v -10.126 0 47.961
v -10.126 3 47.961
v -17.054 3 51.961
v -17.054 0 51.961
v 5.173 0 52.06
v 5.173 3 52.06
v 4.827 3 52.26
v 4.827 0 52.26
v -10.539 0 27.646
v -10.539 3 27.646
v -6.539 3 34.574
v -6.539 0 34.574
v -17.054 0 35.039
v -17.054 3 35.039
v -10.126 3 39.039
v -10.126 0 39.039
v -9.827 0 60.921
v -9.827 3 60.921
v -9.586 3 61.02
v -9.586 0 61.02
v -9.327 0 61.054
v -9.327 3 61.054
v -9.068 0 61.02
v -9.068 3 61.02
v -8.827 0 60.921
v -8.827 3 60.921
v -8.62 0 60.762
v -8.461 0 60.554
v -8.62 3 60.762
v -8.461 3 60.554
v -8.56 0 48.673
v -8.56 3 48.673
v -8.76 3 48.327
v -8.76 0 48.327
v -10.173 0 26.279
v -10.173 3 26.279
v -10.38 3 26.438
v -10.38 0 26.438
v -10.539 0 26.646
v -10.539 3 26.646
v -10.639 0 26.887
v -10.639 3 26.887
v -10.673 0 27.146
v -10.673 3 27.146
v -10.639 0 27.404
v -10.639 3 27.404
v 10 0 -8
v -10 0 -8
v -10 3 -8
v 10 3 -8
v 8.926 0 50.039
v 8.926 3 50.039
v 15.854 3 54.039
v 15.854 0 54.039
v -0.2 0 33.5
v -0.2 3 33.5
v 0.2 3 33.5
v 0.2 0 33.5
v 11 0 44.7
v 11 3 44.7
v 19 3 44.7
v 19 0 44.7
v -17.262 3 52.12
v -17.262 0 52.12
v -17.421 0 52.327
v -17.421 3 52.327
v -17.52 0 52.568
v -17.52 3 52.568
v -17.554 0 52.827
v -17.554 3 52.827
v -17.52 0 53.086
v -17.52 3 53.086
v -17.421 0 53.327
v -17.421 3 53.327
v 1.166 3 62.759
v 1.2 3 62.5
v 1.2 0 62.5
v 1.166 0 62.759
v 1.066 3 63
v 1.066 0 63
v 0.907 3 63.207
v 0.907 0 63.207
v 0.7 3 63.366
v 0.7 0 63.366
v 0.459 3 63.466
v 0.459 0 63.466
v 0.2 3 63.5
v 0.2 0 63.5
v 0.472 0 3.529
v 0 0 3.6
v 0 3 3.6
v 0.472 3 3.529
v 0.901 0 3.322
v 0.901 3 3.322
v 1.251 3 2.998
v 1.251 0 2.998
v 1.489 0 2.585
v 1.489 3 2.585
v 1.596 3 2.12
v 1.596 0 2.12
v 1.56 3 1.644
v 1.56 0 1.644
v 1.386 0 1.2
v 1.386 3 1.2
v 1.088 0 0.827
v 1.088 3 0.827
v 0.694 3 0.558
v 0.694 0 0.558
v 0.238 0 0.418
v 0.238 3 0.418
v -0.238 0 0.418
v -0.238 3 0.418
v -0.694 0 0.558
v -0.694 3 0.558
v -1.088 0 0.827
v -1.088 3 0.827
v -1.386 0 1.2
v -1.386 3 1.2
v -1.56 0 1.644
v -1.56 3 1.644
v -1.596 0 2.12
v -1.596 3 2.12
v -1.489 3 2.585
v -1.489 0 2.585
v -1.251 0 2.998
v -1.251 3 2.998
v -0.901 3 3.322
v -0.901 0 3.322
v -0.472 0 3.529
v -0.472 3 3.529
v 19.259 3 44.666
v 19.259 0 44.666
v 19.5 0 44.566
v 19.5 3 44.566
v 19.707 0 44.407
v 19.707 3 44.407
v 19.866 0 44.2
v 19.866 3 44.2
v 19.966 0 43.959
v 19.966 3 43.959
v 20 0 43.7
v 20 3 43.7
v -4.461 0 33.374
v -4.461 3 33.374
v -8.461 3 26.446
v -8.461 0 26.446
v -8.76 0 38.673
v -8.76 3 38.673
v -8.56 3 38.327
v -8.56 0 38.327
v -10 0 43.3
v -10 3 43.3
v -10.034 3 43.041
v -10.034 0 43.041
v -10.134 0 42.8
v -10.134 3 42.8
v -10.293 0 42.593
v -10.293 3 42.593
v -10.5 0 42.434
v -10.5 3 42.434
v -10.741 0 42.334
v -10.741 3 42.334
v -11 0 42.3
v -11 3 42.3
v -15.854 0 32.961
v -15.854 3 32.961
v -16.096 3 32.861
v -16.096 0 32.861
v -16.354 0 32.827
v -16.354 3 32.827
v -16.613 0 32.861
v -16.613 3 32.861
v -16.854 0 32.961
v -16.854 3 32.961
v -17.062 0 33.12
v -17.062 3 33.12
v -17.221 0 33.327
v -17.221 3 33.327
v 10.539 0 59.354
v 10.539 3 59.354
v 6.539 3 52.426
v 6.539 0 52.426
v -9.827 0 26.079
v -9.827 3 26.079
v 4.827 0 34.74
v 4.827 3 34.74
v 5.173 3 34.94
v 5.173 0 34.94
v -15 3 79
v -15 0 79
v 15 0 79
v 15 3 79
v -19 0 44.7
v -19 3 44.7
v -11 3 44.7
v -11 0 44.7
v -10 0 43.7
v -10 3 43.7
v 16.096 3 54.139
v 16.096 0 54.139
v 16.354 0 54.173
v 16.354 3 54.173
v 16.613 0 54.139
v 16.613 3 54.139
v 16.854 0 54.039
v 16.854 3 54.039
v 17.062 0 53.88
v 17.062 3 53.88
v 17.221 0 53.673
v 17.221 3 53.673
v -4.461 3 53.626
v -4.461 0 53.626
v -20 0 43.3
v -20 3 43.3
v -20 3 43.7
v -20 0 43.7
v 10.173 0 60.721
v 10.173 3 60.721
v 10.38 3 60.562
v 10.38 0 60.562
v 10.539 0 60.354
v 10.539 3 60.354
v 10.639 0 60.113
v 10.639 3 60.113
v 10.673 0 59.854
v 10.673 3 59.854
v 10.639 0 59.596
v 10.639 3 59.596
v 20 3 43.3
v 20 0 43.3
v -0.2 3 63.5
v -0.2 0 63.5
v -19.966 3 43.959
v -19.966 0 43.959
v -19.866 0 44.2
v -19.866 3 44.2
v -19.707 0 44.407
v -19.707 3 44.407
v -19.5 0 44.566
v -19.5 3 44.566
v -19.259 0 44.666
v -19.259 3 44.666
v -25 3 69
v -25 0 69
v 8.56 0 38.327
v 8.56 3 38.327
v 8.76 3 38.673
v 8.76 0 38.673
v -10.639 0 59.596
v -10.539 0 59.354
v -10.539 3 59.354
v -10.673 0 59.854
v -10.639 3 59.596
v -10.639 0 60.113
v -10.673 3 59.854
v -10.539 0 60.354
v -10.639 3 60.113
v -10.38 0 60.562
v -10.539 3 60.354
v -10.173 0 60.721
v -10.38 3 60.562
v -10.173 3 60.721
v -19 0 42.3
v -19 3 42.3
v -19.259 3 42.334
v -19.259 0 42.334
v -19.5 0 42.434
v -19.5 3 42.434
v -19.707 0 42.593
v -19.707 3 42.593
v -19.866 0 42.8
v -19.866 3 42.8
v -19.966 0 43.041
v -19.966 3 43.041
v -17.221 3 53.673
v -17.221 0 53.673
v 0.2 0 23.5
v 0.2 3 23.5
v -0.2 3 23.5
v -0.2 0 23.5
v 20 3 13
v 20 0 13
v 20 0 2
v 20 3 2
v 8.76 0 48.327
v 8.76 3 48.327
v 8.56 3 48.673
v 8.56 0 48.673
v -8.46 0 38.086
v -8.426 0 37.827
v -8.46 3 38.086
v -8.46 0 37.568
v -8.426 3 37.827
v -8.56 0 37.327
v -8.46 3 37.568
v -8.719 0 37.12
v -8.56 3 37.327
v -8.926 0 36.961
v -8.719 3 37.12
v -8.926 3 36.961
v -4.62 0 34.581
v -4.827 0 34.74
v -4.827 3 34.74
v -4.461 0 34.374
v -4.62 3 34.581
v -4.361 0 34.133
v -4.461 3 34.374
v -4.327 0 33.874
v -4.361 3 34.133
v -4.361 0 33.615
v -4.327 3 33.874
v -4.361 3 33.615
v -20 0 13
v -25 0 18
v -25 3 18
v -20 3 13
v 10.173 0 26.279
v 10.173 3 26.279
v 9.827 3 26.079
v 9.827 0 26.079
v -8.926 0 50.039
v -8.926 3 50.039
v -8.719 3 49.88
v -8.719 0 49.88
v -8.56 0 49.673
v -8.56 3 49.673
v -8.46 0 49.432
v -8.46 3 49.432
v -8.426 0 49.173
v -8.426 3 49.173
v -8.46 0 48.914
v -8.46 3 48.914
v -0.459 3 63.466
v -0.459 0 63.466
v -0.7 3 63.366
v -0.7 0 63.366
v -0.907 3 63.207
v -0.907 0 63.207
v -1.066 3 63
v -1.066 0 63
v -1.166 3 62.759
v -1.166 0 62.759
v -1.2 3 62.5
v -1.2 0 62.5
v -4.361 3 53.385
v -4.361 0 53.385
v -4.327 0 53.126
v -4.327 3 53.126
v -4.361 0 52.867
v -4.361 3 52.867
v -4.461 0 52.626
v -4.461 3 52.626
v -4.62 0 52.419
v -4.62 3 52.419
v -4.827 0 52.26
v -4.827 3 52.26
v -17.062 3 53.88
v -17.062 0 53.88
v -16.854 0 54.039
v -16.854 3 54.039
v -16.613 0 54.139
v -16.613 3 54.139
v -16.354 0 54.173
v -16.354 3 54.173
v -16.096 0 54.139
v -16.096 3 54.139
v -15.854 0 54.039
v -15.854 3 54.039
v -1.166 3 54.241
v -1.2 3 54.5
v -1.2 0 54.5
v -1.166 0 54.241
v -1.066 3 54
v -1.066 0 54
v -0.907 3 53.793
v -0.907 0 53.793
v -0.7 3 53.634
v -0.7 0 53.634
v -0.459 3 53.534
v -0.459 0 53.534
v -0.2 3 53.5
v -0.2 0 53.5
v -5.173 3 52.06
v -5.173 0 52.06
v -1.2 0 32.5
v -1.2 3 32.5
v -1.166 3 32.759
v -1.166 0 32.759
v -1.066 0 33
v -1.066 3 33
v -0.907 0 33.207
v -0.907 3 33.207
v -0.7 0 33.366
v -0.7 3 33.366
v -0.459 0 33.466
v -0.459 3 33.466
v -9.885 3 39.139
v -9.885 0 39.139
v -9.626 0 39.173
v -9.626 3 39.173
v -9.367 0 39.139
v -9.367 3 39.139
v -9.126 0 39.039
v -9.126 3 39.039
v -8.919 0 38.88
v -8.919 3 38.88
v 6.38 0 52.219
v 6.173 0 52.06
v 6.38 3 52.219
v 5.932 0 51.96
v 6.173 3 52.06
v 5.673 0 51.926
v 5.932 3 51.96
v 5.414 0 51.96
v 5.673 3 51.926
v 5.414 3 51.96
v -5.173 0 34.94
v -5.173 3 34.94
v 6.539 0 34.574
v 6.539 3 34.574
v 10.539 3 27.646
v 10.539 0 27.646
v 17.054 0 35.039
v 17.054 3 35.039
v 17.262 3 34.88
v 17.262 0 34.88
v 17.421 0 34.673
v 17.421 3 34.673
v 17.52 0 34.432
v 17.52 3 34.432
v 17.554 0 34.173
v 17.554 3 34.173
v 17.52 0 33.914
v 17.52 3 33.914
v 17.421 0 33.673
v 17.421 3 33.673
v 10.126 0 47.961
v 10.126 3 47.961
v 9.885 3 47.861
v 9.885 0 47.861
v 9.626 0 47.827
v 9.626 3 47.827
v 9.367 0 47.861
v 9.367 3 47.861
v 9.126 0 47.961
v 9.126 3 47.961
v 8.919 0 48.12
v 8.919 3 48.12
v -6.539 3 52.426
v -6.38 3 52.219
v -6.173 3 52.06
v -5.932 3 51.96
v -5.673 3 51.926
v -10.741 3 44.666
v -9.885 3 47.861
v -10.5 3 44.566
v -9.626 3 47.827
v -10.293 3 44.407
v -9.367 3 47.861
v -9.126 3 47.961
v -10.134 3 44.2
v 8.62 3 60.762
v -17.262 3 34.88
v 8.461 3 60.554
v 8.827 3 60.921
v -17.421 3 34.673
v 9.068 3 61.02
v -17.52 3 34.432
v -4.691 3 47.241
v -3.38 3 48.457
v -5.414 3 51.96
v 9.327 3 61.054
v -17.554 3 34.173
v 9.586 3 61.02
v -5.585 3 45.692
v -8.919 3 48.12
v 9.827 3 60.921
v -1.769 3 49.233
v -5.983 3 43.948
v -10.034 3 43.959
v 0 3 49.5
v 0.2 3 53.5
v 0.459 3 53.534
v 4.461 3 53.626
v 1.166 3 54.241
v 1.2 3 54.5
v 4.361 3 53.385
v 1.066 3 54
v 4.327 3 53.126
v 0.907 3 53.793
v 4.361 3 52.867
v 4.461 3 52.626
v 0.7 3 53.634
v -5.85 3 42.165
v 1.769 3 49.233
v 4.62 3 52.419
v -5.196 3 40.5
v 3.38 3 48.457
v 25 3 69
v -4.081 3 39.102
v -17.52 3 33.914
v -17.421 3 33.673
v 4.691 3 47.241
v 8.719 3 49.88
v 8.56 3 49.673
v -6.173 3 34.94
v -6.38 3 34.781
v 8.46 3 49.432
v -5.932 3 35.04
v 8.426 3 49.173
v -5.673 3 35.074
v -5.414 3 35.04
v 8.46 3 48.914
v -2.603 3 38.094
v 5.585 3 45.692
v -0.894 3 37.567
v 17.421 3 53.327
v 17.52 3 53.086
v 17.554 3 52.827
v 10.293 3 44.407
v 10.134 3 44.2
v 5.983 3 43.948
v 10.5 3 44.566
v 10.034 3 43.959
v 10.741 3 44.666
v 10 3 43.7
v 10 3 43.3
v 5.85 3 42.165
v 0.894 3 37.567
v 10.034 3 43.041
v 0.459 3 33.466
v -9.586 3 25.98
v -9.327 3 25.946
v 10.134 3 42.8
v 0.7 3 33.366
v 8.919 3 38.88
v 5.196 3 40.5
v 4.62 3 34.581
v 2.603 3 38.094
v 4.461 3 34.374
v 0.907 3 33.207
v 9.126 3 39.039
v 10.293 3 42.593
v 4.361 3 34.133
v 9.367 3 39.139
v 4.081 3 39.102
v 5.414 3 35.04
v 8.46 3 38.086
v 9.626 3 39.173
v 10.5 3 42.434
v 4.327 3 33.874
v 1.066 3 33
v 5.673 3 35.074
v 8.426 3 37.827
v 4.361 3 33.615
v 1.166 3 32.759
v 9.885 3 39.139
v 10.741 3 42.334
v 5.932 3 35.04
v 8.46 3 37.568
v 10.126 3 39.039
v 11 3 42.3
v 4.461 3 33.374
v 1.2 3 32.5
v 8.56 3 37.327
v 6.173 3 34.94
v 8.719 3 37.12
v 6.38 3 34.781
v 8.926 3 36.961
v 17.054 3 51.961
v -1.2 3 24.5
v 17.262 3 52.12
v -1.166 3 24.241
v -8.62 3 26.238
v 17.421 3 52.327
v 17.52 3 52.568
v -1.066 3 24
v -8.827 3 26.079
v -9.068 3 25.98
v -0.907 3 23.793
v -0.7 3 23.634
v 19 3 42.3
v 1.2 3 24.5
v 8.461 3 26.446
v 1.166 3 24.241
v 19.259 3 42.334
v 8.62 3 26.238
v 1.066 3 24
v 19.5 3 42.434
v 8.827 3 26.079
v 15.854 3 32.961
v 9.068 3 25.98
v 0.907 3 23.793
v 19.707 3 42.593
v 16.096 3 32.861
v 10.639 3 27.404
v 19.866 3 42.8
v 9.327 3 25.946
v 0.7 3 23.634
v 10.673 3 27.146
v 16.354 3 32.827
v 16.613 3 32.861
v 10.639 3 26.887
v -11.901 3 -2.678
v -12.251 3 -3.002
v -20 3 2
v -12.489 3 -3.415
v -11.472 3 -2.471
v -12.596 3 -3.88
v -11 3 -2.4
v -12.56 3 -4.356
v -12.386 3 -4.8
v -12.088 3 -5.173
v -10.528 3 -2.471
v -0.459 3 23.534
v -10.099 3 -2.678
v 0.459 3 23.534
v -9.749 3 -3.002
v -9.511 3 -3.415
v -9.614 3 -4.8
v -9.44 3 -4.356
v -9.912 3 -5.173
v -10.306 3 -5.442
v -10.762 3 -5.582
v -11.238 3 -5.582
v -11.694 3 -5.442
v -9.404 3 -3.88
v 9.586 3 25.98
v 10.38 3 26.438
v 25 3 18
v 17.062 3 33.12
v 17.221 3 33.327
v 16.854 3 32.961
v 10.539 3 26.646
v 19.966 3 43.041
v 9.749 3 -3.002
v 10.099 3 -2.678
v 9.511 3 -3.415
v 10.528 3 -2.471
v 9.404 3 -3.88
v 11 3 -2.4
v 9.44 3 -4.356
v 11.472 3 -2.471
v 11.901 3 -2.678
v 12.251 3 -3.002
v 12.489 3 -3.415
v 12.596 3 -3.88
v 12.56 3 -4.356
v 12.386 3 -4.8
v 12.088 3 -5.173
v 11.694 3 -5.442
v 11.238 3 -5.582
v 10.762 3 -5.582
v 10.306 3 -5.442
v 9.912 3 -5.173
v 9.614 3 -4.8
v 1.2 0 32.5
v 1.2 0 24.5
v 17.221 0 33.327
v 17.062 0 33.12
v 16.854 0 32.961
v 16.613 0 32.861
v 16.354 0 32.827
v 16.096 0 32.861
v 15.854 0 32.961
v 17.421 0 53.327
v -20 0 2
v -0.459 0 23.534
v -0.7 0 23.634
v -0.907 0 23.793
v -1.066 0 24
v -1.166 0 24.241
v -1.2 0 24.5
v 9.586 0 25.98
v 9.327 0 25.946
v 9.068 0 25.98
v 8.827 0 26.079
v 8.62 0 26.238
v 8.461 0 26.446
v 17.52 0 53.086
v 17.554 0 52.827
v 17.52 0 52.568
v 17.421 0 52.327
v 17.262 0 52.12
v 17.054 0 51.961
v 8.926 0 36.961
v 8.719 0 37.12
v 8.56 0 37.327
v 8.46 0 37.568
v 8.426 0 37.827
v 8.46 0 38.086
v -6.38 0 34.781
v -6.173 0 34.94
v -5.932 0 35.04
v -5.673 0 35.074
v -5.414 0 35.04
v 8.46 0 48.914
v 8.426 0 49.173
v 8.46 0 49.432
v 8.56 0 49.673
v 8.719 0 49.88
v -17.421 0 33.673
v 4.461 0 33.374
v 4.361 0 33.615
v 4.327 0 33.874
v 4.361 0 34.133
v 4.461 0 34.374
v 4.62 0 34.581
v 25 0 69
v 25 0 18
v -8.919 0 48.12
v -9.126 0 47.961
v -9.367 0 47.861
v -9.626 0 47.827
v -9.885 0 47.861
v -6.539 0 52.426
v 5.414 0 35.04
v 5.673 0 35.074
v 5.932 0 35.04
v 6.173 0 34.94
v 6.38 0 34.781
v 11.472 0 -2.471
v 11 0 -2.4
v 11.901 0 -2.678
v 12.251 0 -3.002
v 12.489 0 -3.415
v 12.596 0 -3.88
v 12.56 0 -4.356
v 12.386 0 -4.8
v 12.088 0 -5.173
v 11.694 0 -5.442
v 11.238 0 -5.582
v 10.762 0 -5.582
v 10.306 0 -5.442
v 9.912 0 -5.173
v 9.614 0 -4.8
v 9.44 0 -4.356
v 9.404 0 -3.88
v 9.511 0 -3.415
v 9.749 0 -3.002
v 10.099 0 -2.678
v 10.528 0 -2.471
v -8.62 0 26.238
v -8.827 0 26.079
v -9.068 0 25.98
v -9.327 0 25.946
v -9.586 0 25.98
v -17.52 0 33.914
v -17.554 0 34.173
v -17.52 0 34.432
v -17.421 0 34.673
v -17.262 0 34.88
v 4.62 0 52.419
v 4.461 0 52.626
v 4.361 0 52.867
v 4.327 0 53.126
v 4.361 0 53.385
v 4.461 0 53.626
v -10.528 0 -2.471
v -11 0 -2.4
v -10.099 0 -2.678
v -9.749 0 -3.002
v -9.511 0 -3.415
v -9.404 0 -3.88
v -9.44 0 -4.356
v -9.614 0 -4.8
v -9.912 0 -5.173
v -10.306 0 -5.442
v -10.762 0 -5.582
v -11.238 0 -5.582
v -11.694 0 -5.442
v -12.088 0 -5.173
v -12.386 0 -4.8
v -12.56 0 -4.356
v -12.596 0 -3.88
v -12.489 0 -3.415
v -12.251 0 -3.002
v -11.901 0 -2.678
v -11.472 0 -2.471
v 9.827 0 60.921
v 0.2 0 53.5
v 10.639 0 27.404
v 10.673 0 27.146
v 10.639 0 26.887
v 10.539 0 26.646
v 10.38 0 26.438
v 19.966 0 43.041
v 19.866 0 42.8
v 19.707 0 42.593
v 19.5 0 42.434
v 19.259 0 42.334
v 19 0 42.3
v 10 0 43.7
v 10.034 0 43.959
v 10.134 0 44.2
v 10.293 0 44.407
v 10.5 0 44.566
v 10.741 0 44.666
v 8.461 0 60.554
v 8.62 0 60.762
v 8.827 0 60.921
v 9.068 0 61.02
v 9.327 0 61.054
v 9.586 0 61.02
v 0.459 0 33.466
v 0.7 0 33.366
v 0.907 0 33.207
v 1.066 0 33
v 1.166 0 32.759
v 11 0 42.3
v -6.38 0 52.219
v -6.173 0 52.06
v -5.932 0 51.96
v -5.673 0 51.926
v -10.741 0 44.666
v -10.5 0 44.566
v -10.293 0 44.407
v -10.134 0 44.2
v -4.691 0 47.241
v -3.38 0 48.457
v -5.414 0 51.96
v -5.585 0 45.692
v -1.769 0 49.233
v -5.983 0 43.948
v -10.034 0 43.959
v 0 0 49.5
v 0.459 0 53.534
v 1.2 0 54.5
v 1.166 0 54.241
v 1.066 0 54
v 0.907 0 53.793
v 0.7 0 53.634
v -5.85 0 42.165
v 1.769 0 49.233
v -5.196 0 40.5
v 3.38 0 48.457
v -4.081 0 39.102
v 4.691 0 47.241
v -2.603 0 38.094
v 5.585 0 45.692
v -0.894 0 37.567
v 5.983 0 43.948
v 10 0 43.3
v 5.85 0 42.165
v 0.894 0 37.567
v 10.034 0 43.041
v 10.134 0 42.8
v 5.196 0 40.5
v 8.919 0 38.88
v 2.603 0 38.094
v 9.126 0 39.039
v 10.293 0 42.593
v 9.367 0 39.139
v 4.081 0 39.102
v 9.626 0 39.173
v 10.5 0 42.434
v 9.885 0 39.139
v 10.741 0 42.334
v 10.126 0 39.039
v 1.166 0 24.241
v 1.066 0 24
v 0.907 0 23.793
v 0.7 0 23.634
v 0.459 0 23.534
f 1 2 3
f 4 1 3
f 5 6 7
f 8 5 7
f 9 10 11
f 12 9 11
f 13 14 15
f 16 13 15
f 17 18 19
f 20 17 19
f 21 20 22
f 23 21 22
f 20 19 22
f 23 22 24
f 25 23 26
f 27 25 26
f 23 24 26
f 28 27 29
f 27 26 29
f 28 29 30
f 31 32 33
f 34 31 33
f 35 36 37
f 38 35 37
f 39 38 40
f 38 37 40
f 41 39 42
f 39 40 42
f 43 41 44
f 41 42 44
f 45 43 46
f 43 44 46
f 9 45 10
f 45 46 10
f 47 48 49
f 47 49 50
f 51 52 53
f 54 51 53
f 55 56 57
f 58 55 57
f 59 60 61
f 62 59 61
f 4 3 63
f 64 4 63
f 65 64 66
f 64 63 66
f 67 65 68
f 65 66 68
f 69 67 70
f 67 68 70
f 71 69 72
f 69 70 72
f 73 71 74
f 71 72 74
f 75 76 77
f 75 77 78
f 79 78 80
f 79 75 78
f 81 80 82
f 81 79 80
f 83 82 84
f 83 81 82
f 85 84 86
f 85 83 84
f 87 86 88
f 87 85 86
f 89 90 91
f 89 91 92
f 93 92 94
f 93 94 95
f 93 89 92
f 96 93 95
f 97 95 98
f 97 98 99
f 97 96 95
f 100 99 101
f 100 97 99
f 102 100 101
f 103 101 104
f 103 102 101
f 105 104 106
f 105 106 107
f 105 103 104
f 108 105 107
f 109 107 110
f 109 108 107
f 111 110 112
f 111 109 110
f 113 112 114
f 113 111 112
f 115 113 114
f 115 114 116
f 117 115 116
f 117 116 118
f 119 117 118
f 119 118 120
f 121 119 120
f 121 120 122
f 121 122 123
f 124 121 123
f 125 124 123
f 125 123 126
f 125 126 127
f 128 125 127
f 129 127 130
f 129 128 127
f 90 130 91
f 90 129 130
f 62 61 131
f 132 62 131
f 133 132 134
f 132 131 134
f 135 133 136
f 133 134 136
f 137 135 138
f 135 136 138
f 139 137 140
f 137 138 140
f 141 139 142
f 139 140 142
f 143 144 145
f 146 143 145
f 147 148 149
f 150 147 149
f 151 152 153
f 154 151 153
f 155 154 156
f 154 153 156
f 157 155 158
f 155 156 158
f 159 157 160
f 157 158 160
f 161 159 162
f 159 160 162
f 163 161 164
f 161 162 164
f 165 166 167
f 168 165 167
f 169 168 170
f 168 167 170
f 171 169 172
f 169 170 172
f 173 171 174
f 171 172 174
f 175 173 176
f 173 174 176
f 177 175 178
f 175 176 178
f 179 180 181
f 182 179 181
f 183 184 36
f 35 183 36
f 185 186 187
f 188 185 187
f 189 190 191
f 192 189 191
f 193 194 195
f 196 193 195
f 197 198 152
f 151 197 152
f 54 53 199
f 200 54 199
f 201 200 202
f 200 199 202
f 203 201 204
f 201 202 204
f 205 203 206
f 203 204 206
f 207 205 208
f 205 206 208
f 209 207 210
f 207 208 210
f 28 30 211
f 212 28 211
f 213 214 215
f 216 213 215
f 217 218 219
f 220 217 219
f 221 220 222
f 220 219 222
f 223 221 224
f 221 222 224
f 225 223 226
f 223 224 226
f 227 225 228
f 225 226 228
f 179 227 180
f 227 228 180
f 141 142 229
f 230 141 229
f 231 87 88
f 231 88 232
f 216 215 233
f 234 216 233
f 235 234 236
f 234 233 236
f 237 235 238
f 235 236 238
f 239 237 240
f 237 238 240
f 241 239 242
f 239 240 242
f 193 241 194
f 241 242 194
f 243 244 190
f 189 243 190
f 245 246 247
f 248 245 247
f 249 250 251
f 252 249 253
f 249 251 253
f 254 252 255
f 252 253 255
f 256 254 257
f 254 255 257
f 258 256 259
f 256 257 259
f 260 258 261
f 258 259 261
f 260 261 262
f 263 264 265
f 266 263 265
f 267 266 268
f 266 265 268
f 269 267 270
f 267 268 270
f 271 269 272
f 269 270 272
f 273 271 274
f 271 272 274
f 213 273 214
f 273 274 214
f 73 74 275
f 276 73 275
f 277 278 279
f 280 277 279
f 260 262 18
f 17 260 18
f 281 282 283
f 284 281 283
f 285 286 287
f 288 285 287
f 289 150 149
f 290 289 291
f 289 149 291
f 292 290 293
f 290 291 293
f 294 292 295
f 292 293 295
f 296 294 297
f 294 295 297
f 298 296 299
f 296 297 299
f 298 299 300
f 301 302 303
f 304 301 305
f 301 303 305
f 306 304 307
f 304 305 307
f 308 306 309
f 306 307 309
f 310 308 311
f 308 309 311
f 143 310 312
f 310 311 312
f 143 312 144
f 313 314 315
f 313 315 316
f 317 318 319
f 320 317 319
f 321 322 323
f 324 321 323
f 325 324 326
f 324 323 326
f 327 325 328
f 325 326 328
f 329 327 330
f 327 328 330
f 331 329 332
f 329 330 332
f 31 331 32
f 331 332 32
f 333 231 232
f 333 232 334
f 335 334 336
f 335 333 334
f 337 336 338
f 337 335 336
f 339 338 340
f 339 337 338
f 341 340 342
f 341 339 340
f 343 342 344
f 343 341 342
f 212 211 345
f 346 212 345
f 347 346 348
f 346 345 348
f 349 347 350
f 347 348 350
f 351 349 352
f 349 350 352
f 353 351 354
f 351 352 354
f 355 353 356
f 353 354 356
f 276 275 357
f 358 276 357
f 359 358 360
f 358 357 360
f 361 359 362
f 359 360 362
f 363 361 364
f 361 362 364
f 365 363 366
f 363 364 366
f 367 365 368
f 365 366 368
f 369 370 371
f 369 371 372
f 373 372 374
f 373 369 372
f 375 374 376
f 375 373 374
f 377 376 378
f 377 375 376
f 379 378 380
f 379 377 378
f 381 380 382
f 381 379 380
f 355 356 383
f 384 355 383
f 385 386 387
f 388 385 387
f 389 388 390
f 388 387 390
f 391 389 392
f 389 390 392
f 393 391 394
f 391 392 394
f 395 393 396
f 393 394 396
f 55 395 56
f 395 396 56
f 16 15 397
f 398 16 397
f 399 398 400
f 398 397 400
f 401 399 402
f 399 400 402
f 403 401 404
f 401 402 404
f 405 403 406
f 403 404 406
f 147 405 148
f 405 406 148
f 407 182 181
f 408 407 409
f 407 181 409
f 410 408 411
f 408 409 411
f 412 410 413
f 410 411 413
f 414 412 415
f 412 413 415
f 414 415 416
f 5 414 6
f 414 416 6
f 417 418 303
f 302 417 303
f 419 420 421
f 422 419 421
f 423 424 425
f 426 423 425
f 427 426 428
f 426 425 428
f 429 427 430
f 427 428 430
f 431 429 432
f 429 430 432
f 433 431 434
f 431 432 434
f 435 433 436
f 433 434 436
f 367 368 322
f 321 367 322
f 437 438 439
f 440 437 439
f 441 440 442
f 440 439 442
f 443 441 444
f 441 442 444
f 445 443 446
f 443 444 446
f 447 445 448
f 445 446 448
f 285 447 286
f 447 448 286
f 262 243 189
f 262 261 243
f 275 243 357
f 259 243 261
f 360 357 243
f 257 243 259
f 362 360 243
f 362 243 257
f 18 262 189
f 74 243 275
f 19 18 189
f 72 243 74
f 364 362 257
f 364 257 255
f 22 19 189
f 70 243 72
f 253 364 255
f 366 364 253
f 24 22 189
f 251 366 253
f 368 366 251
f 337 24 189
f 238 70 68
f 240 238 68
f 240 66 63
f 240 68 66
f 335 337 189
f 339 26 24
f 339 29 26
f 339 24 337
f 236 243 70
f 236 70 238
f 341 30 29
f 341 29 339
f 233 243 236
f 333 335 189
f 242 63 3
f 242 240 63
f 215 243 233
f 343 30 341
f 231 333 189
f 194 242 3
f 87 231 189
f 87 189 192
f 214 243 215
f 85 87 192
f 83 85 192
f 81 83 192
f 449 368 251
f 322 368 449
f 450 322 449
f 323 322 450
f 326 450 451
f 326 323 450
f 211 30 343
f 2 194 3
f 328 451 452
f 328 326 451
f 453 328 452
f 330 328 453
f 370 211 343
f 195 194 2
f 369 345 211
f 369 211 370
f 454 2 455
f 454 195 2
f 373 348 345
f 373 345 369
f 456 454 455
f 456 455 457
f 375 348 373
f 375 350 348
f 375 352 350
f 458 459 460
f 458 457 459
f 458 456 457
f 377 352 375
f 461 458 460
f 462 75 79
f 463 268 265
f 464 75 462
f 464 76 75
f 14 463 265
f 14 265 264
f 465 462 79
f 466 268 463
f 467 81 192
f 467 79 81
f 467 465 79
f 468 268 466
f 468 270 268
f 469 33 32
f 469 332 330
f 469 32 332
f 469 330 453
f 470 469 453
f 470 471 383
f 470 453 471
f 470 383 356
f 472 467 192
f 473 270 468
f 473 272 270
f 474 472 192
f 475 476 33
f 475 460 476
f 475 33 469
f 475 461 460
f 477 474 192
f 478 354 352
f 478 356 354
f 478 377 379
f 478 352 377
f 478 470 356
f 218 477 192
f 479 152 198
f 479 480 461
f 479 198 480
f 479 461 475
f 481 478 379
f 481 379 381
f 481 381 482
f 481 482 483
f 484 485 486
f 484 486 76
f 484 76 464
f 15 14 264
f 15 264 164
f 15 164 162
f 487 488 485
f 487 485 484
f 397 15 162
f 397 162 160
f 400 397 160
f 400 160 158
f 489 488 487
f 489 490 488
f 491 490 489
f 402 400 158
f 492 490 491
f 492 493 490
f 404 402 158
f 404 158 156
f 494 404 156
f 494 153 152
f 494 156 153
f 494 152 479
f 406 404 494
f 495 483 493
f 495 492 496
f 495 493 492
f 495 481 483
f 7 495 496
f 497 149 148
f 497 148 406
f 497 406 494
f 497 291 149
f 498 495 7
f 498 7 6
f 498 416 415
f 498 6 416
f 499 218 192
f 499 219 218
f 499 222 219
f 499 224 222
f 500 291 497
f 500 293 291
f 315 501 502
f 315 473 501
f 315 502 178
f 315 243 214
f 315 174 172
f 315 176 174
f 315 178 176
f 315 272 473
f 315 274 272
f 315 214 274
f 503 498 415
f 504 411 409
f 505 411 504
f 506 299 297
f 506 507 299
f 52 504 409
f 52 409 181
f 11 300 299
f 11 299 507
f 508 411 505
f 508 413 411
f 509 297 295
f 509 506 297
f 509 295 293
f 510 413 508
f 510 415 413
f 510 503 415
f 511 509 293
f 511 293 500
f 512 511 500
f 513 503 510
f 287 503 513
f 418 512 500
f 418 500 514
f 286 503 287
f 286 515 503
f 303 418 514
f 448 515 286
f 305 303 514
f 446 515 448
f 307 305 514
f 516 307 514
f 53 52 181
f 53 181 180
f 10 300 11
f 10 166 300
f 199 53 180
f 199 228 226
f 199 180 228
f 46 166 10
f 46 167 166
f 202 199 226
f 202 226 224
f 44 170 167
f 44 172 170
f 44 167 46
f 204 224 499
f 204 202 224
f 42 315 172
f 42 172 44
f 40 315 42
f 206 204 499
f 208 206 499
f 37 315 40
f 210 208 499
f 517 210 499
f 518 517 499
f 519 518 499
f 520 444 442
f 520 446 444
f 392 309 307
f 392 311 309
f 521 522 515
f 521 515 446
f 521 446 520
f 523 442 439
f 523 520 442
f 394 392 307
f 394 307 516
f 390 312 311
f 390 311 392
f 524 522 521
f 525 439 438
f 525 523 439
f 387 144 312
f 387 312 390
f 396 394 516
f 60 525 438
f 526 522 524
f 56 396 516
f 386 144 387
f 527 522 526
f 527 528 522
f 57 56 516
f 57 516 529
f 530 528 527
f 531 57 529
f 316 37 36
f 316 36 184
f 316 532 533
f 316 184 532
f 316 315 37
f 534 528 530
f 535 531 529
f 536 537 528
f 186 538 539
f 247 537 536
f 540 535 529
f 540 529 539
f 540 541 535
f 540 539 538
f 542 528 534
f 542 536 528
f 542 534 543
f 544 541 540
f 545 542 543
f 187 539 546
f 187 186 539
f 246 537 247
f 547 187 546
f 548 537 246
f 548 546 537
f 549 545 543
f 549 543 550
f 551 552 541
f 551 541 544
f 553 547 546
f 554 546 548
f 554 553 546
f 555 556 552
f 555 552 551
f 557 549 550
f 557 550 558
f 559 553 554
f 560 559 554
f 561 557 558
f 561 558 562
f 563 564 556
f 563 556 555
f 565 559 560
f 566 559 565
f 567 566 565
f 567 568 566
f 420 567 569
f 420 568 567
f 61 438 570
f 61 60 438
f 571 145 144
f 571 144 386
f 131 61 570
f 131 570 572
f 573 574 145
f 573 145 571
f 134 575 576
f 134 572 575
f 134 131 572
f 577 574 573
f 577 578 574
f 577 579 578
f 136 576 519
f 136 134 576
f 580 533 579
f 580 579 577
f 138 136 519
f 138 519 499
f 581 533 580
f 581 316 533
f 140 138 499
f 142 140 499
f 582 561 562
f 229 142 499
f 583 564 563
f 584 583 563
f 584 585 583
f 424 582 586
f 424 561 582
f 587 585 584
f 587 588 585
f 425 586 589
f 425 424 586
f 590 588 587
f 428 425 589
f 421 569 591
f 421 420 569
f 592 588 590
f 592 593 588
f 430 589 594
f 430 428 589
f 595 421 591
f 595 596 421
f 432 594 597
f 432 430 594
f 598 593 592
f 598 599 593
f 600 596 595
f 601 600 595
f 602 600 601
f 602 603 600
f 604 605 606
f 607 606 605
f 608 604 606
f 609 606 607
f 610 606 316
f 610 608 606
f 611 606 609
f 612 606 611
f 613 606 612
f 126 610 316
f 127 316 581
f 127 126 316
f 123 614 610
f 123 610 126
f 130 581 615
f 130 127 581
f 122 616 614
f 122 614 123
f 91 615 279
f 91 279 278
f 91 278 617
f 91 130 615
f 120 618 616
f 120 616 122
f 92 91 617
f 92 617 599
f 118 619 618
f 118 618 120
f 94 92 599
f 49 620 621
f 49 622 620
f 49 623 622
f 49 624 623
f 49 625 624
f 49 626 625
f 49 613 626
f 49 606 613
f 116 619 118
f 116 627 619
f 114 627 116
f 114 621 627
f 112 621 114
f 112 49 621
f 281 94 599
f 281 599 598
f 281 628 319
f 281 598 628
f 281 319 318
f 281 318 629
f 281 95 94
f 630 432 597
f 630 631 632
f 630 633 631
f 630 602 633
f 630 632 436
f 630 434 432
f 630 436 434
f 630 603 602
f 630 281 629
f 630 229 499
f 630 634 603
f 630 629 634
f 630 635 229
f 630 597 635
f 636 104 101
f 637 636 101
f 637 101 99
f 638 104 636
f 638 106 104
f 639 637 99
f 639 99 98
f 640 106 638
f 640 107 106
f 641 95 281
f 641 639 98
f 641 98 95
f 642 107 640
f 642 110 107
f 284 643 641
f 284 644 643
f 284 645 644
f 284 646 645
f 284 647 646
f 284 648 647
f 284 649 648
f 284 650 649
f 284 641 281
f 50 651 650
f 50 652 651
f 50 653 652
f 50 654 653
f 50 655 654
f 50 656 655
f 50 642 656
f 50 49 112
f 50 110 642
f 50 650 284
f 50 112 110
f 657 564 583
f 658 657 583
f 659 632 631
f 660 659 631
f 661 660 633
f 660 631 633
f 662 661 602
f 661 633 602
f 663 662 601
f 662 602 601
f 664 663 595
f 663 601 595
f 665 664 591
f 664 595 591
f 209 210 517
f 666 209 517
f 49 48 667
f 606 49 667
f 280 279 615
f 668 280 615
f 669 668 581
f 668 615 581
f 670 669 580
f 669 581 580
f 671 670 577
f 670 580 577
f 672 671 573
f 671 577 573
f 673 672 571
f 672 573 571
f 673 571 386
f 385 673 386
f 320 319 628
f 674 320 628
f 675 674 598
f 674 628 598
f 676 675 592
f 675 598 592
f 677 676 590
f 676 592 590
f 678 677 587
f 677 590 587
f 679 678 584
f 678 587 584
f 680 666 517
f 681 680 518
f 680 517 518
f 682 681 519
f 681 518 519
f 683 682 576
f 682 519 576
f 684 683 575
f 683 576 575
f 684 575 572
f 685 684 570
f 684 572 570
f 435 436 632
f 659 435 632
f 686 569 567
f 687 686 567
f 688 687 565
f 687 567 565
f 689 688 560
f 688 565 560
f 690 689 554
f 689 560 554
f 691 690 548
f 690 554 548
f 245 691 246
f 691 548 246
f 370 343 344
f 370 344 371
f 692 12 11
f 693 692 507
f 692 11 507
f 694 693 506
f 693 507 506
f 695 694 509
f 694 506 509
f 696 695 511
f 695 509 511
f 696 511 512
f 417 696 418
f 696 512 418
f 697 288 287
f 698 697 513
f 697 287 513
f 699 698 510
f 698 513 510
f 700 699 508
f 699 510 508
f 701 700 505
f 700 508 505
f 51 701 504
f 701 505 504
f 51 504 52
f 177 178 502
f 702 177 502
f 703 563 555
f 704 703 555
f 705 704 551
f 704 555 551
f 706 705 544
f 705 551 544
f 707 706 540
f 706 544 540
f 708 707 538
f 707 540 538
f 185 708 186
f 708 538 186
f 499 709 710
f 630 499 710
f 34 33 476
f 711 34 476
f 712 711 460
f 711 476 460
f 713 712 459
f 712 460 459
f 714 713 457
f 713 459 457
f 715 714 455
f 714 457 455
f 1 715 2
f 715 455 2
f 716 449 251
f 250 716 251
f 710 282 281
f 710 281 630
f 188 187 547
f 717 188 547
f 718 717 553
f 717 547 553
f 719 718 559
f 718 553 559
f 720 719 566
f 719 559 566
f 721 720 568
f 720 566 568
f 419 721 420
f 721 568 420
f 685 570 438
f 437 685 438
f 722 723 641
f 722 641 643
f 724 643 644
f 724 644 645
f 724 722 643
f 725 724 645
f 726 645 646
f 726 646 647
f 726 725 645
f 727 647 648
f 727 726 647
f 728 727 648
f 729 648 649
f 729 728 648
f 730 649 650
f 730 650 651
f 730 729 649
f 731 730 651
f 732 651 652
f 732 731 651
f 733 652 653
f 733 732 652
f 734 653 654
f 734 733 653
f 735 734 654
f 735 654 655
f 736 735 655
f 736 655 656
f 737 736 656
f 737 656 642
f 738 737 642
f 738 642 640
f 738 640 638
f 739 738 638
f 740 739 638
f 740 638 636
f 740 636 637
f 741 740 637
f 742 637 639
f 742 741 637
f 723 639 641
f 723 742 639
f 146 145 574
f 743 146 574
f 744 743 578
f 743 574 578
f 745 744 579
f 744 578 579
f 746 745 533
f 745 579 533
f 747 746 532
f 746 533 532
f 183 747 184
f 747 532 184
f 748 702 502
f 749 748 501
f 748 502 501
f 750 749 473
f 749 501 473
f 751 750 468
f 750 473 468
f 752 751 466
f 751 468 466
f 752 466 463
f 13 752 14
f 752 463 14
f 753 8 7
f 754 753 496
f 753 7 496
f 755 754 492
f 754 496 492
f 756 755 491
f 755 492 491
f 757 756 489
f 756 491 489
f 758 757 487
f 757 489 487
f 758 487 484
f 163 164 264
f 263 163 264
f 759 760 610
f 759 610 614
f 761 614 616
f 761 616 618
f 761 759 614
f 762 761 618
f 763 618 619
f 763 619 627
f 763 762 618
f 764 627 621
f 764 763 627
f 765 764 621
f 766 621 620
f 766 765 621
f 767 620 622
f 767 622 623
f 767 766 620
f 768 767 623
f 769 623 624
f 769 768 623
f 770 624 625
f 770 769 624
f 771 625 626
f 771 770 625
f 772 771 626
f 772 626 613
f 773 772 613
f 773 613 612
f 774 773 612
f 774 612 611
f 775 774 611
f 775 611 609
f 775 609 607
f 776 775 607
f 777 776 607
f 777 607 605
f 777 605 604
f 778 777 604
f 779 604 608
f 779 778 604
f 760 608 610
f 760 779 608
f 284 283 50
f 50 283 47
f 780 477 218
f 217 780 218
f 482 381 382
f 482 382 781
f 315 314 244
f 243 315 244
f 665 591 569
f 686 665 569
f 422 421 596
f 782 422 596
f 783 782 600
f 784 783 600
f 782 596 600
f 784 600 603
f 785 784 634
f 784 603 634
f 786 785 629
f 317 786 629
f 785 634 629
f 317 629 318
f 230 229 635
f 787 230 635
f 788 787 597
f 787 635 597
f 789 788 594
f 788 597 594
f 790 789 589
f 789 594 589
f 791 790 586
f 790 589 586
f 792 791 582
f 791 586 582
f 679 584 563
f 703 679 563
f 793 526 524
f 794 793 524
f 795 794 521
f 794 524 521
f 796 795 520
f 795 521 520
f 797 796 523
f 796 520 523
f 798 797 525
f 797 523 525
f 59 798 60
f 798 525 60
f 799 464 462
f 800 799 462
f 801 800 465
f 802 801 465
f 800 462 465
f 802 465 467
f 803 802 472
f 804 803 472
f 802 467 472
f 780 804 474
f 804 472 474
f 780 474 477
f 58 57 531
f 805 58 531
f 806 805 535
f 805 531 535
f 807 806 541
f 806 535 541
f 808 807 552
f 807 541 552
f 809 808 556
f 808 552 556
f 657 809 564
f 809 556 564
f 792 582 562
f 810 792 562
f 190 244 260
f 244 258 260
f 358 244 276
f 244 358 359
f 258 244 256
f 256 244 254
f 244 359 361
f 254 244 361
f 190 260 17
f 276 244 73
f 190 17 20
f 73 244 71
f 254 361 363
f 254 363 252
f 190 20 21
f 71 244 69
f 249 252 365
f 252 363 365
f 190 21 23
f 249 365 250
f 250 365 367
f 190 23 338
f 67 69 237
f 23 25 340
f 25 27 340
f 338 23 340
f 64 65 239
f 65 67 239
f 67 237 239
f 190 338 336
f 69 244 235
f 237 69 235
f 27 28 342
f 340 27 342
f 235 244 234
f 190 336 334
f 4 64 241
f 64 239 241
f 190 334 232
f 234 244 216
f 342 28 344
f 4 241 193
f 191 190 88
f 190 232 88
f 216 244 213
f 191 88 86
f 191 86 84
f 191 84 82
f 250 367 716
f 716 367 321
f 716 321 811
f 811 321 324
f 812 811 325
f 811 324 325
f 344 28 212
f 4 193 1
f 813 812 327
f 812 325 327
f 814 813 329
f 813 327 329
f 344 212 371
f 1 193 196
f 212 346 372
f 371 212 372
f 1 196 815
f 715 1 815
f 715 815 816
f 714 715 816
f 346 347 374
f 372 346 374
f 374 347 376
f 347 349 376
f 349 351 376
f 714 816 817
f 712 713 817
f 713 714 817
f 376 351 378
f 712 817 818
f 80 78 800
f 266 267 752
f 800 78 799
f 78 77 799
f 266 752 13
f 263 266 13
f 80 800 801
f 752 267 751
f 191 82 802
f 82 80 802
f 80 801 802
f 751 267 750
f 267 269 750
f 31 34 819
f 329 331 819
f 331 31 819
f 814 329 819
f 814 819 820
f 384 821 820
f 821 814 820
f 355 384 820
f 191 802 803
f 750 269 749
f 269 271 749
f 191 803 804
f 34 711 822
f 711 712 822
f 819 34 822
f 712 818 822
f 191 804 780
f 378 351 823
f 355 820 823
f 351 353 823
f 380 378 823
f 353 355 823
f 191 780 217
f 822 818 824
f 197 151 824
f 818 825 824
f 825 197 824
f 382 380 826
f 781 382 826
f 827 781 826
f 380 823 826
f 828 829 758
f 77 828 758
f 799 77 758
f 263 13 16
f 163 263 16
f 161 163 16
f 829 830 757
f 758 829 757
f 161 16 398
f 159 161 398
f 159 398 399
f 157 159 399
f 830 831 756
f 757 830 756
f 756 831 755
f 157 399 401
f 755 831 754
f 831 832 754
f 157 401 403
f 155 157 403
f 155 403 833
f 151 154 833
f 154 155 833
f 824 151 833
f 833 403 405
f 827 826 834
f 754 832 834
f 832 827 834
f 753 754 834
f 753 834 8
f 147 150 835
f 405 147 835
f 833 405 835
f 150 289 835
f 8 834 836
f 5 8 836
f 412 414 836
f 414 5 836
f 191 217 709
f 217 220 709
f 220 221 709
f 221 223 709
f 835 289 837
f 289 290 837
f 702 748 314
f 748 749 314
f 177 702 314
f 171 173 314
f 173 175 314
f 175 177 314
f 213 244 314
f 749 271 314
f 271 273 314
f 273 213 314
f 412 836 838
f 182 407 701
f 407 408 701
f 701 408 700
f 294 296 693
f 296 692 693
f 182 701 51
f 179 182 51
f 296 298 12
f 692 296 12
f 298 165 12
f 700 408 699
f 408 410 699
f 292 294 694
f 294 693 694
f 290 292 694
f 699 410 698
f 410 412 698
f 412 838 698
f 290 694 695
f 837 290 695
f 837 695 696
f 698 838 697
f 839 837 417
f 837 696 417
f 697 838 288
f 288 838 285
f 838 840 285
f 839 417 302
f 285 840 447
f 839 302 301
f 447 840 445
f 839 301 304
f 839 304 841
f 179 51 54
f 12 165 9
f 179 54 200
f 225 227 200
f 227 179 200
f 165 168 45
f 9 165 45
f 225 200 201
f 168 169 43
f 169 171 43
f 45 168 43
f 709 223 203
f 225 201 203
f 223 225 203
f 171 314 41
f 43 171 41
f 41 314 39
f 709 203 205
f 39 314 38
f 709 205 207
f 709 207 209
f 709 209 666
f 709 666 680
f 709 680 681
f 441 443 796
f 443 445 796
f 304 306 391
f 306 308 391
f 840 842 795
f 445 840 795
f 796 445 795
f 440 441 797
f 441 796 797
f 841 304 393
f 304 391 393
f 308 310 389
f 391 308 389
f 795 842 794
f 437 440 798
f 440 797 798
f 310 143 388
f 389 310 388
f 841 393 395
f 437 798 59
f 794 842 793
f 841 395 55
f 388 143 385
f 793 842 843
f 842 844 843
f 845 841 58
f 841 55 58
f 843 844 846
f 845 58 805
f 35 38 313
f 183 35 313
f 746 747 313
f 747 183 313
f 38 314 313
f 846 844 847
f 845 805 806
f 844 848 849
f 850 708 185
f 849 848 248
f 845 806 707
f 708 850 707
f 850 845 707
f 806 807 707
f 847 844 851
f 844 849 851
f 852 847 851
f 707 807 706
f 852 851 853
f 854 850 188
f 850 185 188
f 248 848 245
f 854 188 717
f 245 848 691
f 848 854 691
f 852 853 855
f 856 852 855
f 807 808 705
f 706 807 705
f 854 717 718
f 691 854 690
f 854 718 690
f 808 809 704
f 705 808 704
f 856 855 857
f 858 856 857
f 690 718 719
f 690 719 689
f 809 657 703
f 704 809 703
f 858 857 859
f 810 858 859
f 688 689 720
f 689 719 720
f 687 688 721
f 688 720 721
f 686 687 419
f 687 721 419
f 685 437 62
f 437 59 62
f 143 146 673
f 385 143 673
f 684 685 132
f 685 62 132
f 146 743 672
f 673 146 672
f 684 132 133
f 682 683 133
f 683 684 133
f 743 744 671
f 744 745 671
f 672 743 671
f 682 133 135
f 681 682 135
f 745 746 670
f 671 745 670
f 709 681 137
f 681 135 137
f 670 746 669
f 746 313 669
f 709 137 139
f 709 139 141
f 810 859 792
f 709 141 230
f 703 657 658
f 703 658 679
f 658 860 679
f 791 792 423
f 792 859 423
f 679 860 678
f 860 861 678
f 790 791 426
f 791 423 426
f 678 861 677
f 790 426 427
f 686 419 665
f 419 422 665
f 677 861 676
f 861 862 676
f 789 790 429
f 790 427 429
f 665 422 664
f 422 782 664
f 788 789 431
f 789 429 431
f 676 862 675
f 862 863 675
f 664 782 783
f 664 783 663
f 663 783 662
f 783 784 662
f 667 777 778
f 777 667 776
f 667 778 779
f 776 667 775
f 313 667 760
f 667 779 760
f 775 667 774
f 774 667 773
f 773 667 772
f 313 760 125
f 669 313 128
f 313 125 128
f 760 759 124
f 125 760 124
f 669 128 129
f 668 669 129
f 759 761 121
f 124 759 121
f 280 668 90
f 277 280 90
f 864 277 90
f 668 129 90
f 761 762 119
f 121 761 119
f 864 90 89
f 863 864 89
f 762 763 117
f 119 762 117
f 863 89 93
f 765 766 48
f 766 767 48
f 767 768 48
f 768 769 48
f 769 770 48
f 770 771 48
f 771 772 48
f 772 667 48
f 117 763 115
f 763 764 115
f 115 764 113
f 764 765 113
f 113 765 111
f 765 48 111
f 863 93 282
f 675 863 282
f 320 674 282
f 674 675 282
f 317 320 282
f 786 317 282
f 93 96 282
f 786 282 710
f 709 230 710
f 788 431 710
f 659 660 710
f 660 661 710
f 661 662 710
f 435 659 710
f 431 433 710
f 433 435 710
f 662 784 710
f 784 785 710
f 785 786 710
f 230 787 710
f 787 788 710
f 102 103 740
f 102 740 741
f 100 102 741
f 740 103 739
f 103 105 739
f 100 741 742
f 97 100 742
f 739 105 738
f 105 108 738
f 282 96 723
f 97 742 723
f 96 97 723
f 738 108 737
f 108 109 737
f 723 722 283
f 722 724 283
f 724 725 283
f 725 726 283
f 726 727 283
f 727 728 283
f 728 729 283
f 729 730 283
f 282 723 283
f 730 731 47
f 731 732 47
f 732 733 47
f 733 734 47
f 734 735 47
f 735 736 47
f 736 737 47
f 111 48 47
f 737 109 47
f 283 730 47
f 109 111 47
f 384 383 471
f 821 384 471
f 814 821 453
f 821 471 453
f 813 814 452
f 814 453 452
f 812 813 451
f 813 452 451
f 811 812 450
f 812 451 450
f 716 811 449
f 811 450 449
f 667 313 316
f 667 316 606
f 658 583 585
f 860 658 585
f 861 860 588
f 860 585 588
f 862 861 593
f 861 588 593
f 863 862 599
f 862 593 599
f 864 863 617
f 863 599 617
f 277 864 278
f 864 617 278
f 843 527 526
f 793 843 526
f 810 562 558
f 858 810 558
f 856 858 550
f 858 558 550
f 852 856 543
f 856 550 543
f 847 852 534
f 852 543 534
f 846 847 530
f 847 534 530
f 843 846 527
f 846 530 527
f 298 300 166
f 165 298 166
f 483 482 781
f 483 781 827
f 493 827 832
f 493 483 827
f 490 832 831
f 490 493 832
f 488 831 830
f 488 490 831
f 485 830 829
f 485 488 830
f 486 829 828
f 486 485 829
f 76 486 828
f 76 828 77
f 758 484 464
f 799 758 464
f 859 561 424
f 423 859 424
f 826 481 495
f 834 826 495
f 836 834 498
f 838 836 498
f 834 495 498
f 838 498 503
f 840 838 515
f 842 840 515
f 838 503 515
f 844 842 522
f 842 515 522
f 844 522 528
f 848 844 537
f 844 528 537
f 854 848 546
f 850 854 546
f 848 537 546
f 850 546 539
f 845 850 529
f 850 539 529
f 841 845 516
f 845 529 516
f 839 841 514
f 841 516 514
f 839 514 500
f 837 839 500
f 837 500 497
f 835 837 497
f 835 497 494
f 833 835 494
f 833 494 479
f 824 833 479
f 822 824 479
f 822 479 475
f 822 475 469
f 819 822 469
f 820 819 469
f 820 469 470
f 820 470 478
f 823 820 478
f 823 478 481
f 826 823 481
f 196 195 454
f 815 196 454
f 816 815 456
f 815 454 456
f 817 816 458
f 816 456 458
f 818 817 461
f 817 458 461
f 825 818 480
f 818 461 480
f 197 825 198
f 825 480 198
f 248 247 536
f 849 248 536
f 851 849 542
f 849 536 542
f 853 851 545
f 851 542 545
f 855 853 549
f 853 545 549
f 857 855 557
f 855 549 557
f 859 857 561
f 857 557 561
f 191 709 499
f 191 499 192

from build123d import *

# Parameters (mm, degrees)
SKETCH_1_W          = 40
SKETCH_1_H          = 16
SKETCH_1_R          = 1.6
EXTRUDE_1_DEPTH     = 3
CHAMFER_1_SIZE      = 10
SKETCH_3_R          = 6
CUT_EXTRUDE_1_DEPTH = 10


with BuildPart() as part:
    # 草图1 → 凸台-拉伸1 (new body)
    # profile 1 of 2: a face of its own
    with BuildSketch(Plane(origin=(0, 0, 0), x_dir=(1, 0, 0), z_dir=(0, 1, 0))):
        Polygon((20, -8), (-20, -8), (-25, -8), (-25, -79), (25, -79), (25, -8), align=None)
    # profile 2 of 2: a face of its own
    with BuildSketch(Plane(origin=(0, 0, 0), x_dir=(1, 0, 0), z_dir=(0, 1, 0))):
        Rectangle(SKETCH_1_W, SKETCH_1_H)
        with Locations(Location((-11, 4, 0), (0, 0, 270))):
            Circle(SKETCH_1_R, mode=Mode.SUBTRACT)
        with Locations(Location((0, -2, 0), (0, 0, 270))):
            Circle(SKETCH_1_R, mode=Mode.SUBTRACT)
        with Locations(Location((11, 4, 0), (0, 0, 270))):
            Circle(SKETCH_1_R, mode=Mode.SUBTRACT)
    extrude(amount=EXTRUDE_1_DEPTH)

    # 倒角1
    # the kernel refuses this chamfer: 10 mm, written as the material it takes off along each edge
    with BuildSketch(Plane(origin=(-25, -25.71682988, 79), x_dir=(-0.027495876610586317, 0, -0.9996219169112968), z_dir=(0, 1, 0)), Plane(origin=(-20, -25.71682988, -8), x_dir=(0.9996219169112968, 0, -0.027495876610586317), z_dir=(0, 1, 0)), Plane(origin=(20, -25.71682988, -8), x_dir=(0.027495876610586317, 0, 0.9996219169112968), z_dir=(0, 1, 0))) as chamfer_1_piece_1:
        Polygon((CHAMFER_1_SIZE * 0.999621916911, -CHAMFER_1_SIZE * 0.0274958766106), (-CHAMFER_1_SIZE * 0.0274958766106, -CHAMFER_1_SIZE * 0.999621916911), (0, 0), align=None)
    extrude(amount=54.433659759, mode=Mode.SUBTRACT)
    with BuildSketch(Plane(origin=(-25, -25.71682988, 8), x_dir=(-0.027495876610586313, 0, 0.9996219169112968), z_dir=(0, 1, 0))) as chamfer_1_piece_2_section:
        Polygon((CHAMFER_1_SIZE * 0.999621916911, CHAMFER_1_SIZE * 0.0274958766106), (-CHAMFER_1_SIZE * 0.0274958766106, CHAMFER_1_SIZE * 0.999621916911), (0, 0), align=None)
    chamfer_1_piece_2 = extrude(amount=54.433659759, mode=Mode.PRIVATE)
    chamfer_1_piece_2 = split(chamfer_1_piece_2, bisect_by=Plane(origin=(-20, 1.5, 11.934010841), z_dir=(-1, 0, 0)), keep=Keep.TOP, mode=Mode.PRIVATE)
    add(chamfer_1_piece_2, mode=Mode.SUBTRACT)
    with BuildSketch(Plane(origin=(25, -25.71682988, 8), x_dir=(-0.9996219169112968, 0, -0.027495876610586403), z_dir=(0, 1, 0))) as chamfer_1_piece_3_section:
        Polygon((CHAMFER_1_SIZE * 0.999621916911, CHAMFER_1_SIZE * 0.0274958766106), (-CHAMFER_1_SIZE * 0.0274958766106, CHAMFER_1_SIZE * 0.999621916911), (0, 0), align=None)
    chamfer_1_piece_3 = extrude(amount=54.433659759, mode=Mode.PRIVATE)
    chamfer_1_piece_3 = split(chamfer_1_piece_3, bisect_by=Plane(origin=(20, 1.5, 11.934010841), z_dir=(1, 0, 0)), keep=Keep.TOP, mode=Mode.PRIVATE)
    add(chamfer_1_piece_3, mode=Mode.SUBTRACT)
    with BuildSketch(Plane(origin=(25, -25.71682988, 79), x_dir=(0.027495876610586317, 0, -0.9996219169112968), z_dir=(0, 1, 0))) as chamfer_1_piece_4:
        Polygon((CHAMFER_1_SIZE * 0.999621916911, CHAMFER_1_SIZE * 0.0274958766106), (-CHAMFER_1_SIZE * 0.0274958766106, CHAMFER_1_SIZE * 0.999621916911), (0, 0), align=None)
    extrude(amount=54.433659759, mode=Mode.SUBTRACT)

    # 草图3 → 切除-拉伸1 (cut)
    with BuildSketch(Plane(origin=(0, 3, 0), x_dir=(1, 0, 0), z_dir=(0, 1, 0))):
        with Locations(Location((0, -43.5, 0), (0, 0, 270))):
            Circle(SKETCH_3_R)
        with BuildLine():
            Line((-6.539230485, -52.426279442), (-10.539230485, -59.354482672))
            ThreePointArc((-10.539230485, -59.354482672), (-10.639130907, -60.113301717), (-10.173205081, -60.720508076))
            Line((-10.173205081, -60.720508076), (-9.826794919, -60.920508076))
            ThreePointArc((-9.826794919, -60.920508076), (-9.067975874, -61.020408498), (-8.460769515, -60.554482672))
            Line((-8.460769515, -60.554482672), (-4.460769515, -53.626279442))
            ThreePointArc((-4.460769515, -53.626279442), (-4.360869093, -52.867460397), (-4.826794919, -52.260254038))
            Line((-4.826794919, -52.260254038), (-5.173205081, -52.060254038))
            ThreePointArc((-5.173205081, -52.060254038), (-5.932024126, -51.960353615), (-6.539230485, -52.426279442))
        make_face()
        with BuildLine():
            Line((-0.2, -53.5), (0.2, -53.5))
            ThreePointArc((0.2, -53.5), (0.907106781, -53.792893219), (1.2, -54.5))
            Line((1.2, -54.5), (1.2, -62.5))
            ThreePointArc((1.2, -62.5), (0.907106781, -63.207106781), (0.2, -63.5))
            Line((0.2, -63.5), (-0.2, -63.5))
            ThreePointArc((-0.2, -63.5), (-0.907106781, -63.207106781), (-1.2, -62.5))
            Line((-1.2, -62.5), (-1.2, -54.5))
            ThreePointArc((-1.2, -54.5), (-0.907106781, -53.792893219), (-0.2, -53.5))
        make_face()
        with BuildLine():
            Line((-10.126279442, -47.960769515), (-17.054482672, -51.960769515))
            ThreePointArc((-17.054482672, -51.960769515), (-17.520408498, -52.567975874), (-17.420508076, -53.326794919))
            Line((-17.420508076, -53.326794919), (-17.220508076, -53.673205081))
            ThreePointArc((-17.220508076, -53.673205081), (-16.613301717, -54.139130907), (-15.854482672, -54.039230485))
            Line((-15.854482672, -54.039230485), (-8.926279442, -50.039230485))
            ThreePointArc((-8.926279442, -50.039230485), (-8.460353615, -49.432024126), (-8.560254038, -48.673205081))
            Line((-8.560254038, -48.673205081), (-8.760254038, -48.326794919))
            ThreePointArc((-8.760254038, -48.326794919), (-9.367460397, -47.860869093), (-10.126279442, -47.960769515))
        make_face()
        with BuildLine():
            Line((-11, -42.3), (-19, -42.3))
            ThreePointArc((-19, -42.3), (-19.707106781, -42.592893219), (-20, -43.3))
            Line((-20, -43.3), (-20, -43.7))
            ThreePointArc((-20, -43.7), (-19.707106781, -44.407106781), (-19, -44.7))
            Line((-19, -44.7), (-11, -44.7))
            ThreePointArc((-11, -44.7), (-10.292893219, -44.407106781), (-10, -43.7))
            Line((-10, -43.7), (-10, -43.3))
            ThreePointArc((-10, -43.3), (-10.292893219, -42.592893219), (-11, -42.3))
        make_face()
        with BuildLine():
            Line((-8.926279442, -36.960769515), (-15.854482672, -32.960769515))
            ThreePointArc((-15.854482672, -32.960769515), (-16.613301717, -32.860869093), (-17.220508076, -33.326794919))
            Line((-17.220508076, -33.326794919), (-17.420508076, -33.673205081))
            ThreePointArc((-17.420508076, -33.673205081), (-17.520408498, -34.432024126), (-17.054482672, -35.039230485))
            Line((-17.054482672, -35.039230485), (-10.126279442, -39.039230485))
            ThreePointArc((-10.126279442, -39.039230485), (-9.367460397, -39.139130907), (-8.760254038, -38.673205081))
            Line((-8.760254038, -38.673205081), (-8.560254038, -38.326794919))
            ThreePointArc((-8.560254038, -38.326794919), (-8.460353615, -37.567975874), (-8.926279442, -36.960769515))
        make_face()
        with BuildLine():
            Line((-4.460769515, -33.373720558), (-8.460769515, -26.445517328))
            ThreePointArc((-8.460769515, -26.445517328), (-9.067975874, -25.979591502), (-9.826794919, -26.079491924))
            Line((-9.826794919, -26.079491924), (-10.173205081, -26.279491924))
            ThreePointArc((-10.173205081, -26.279491924), (-10.639130907, -26.886698283), (-10.539230485, -27.645517328))
            Line((-10.539230485, -27.645517328), (-6.539230485, -34.573720558))
            ThreePointArc((-6.539230485, -34.573720558), (-5.932024126, -35.039646385), (-5.173205081, -34.939745962))
            Line((-5.173205081, -34.939745962), (-4.826794919, -34.739745962))
            ThreePointArc((-4.826794919, -34.739745962), (-4.360869093, -34.132539603), (-4.460769515, -33.373720558))
        make_face()
        with BuildLine():
            Line((1.2, -32.5), (1.2, -24.5))
            ThreePointArc((1.2, -24.5), (0.907106781, -23.792893219), (0.2, -23.5))
            Line((0.2, -23.5), (-0.2, -23.5))
            ThreePointArc((-0.2, -23.5), (-0.907106781, -23.792893219), (-1.2, -24.5))
            Line((-1.2, -24.5), (-1.2, -32.5))
            ThreePointArc((-1.2, -32.5), (-0.907106781, -33.207106781), (-0.2, -33.5))
            Line((-0.2, -33.5), (0.2, -33.5))
            ThreePointArc((0.2, -33.5), (0.907106781, -33.207106781), (1.2, -32.5))
        make_face()
        with BuildLine():
            Line((6.539230485, -34.573720558), (10.539230485, -27.645517328))
            ThreePointArc((10.539230485, -27.645517328), (10.639130907, -26.886698283), (10.173205081, -26.279491924))
            Line((10.173205081, -26.279491924), (9.826794919, -26.079491924))
            ThreePointArc((9.826794919, -26.079491924), (9.067975874, -25.979591502), (8.460769515, -26.445517328))
            Line((8.460769515, -26.445517328), (4.460769515, -33.373720558))
            ThreePointArc((4.460769515, -33.373720558), (4.360869093, -34.132539603), (4.826794919, -34.739745962))
            Line((4.826794919, -34.739745962), (5.173205081, -34.939745962))
            ThreePointArc((5.173205081, -34.939745962), (5.932024126, -35.039646385), (6.539230485, -34.573720558))
        make_face()
        with BuildLine():
            Line((10.126279442, -39.039230485), (17.054482672, -35.039230485))
            ThreePointArc((17.054482672, -35.039230485), (17.520408498, -34.432024126), (17.420508076, -33.673205081))
            Line((17.420508076, -33.673205081), (17.220508076, -33.326794919))
            ThreePointArc((17.220508076, -33.326794919), (16.613301717, -32.860869093), (15.854482672, -32.960769515))
            Line((15.854482672, -32.960769515), (8.926279442, -36.960769515))
            ThreePointArc((8.926279442, -36.960769515), (8.460353615, -37.567975874), (8.560254038, -38.326794919))
            Line((8.560254038, -38.326794919), (8.760254038, -38.673205081))
            ThreePointArc((8.760254038, -38.673205081), (9.367460397, -39.139130907), (10.126279442, -39.039230485))
        make_face()
        with BuildLine():
            Line((11, -44.7), (19, -44.7))
            ThreePointArc((19, -44.7), (19.707106781, -44.407106781), (20, -43.7))
            Line((20, -43.7), (20, -43.3))
            ThreePointArc((20, -43.3), (19.707106781, -42.592893219), (19, -42.3))
            Line((19, -42.3), (11, -42.3))
            ThreePointArc((11, -42.3), (10.292893219, -42.592893219), (10, -43.3))
            Line((10, -43.3), (10, -43.7))
            ThreePointArc((10, -43.7), (10.292893219, -44.407106781), (11, -44.7))
        make_face()
        with BuildLine():
            Line((8.926279442, -50.039230485), (15.854482672, -54.039230485))
            ThreePointArc((15.854482672, -54.039230485), (16.613301717, -54.139130907), (17.220508076, -53.673205081))
            Line((17.220508076, -53.673205081), (17.420508076, -53.326794919))
            ThreePointArc((17.420508076, -53.326794919), (17.520408498, -52.567975874), (17.054482672, -51.960769515))
            Line((17.054482672, -51.960769515), (10.126279442, -47.960769515))
            ThreePointArc((10.126279442, -47.960769515), (9.367460397, -47.860869093), (8.760254038, -48.326794919))
            Line((8.760254038, -48.326794919), (8.560254038, -48.673205081))
            ThreePointArc((8.560254038, -48.673205081), (8.460353615, -49.432024126), (8.926279442, -50.039230485))
        make_face()
        with BuildLine():
            Line((4.460769515, -53.626279442), (8.460769515, -60.554482672))
            ThreePointArc((8.460769515, -60.554482672), (9.067975874, -61.020408498), (9.826794919, -60.920508076))
            Line((9.826794919, -60.920508076), (10.173205081, -60.720508076))
            ThreePointArc((10.173205081, -60.720508076), (10.639130907, -60.113301717), (10.539230485, -59.354482672))
            Line((10.539230485, -59.354482672), (6.539230485, -52.426279442))
            ThreePointArc((6.539230485, -52.426279442), (5.932024126, -51.960353615), (5.173205081, -52.060254038))
            Line((5.173205081, -52.060254038), (4.826794919, -52.260254038))
            ThreePointArc((4.826794919, -52.260254038), (4.360869093, -52.867460397), (4.460769515, -53.626279442))
        make_face()
    extrude(amount=-CUT_EXTRUDE_1_DEPTH, mode=Mode.SUBTRACT)


solid = part.part
